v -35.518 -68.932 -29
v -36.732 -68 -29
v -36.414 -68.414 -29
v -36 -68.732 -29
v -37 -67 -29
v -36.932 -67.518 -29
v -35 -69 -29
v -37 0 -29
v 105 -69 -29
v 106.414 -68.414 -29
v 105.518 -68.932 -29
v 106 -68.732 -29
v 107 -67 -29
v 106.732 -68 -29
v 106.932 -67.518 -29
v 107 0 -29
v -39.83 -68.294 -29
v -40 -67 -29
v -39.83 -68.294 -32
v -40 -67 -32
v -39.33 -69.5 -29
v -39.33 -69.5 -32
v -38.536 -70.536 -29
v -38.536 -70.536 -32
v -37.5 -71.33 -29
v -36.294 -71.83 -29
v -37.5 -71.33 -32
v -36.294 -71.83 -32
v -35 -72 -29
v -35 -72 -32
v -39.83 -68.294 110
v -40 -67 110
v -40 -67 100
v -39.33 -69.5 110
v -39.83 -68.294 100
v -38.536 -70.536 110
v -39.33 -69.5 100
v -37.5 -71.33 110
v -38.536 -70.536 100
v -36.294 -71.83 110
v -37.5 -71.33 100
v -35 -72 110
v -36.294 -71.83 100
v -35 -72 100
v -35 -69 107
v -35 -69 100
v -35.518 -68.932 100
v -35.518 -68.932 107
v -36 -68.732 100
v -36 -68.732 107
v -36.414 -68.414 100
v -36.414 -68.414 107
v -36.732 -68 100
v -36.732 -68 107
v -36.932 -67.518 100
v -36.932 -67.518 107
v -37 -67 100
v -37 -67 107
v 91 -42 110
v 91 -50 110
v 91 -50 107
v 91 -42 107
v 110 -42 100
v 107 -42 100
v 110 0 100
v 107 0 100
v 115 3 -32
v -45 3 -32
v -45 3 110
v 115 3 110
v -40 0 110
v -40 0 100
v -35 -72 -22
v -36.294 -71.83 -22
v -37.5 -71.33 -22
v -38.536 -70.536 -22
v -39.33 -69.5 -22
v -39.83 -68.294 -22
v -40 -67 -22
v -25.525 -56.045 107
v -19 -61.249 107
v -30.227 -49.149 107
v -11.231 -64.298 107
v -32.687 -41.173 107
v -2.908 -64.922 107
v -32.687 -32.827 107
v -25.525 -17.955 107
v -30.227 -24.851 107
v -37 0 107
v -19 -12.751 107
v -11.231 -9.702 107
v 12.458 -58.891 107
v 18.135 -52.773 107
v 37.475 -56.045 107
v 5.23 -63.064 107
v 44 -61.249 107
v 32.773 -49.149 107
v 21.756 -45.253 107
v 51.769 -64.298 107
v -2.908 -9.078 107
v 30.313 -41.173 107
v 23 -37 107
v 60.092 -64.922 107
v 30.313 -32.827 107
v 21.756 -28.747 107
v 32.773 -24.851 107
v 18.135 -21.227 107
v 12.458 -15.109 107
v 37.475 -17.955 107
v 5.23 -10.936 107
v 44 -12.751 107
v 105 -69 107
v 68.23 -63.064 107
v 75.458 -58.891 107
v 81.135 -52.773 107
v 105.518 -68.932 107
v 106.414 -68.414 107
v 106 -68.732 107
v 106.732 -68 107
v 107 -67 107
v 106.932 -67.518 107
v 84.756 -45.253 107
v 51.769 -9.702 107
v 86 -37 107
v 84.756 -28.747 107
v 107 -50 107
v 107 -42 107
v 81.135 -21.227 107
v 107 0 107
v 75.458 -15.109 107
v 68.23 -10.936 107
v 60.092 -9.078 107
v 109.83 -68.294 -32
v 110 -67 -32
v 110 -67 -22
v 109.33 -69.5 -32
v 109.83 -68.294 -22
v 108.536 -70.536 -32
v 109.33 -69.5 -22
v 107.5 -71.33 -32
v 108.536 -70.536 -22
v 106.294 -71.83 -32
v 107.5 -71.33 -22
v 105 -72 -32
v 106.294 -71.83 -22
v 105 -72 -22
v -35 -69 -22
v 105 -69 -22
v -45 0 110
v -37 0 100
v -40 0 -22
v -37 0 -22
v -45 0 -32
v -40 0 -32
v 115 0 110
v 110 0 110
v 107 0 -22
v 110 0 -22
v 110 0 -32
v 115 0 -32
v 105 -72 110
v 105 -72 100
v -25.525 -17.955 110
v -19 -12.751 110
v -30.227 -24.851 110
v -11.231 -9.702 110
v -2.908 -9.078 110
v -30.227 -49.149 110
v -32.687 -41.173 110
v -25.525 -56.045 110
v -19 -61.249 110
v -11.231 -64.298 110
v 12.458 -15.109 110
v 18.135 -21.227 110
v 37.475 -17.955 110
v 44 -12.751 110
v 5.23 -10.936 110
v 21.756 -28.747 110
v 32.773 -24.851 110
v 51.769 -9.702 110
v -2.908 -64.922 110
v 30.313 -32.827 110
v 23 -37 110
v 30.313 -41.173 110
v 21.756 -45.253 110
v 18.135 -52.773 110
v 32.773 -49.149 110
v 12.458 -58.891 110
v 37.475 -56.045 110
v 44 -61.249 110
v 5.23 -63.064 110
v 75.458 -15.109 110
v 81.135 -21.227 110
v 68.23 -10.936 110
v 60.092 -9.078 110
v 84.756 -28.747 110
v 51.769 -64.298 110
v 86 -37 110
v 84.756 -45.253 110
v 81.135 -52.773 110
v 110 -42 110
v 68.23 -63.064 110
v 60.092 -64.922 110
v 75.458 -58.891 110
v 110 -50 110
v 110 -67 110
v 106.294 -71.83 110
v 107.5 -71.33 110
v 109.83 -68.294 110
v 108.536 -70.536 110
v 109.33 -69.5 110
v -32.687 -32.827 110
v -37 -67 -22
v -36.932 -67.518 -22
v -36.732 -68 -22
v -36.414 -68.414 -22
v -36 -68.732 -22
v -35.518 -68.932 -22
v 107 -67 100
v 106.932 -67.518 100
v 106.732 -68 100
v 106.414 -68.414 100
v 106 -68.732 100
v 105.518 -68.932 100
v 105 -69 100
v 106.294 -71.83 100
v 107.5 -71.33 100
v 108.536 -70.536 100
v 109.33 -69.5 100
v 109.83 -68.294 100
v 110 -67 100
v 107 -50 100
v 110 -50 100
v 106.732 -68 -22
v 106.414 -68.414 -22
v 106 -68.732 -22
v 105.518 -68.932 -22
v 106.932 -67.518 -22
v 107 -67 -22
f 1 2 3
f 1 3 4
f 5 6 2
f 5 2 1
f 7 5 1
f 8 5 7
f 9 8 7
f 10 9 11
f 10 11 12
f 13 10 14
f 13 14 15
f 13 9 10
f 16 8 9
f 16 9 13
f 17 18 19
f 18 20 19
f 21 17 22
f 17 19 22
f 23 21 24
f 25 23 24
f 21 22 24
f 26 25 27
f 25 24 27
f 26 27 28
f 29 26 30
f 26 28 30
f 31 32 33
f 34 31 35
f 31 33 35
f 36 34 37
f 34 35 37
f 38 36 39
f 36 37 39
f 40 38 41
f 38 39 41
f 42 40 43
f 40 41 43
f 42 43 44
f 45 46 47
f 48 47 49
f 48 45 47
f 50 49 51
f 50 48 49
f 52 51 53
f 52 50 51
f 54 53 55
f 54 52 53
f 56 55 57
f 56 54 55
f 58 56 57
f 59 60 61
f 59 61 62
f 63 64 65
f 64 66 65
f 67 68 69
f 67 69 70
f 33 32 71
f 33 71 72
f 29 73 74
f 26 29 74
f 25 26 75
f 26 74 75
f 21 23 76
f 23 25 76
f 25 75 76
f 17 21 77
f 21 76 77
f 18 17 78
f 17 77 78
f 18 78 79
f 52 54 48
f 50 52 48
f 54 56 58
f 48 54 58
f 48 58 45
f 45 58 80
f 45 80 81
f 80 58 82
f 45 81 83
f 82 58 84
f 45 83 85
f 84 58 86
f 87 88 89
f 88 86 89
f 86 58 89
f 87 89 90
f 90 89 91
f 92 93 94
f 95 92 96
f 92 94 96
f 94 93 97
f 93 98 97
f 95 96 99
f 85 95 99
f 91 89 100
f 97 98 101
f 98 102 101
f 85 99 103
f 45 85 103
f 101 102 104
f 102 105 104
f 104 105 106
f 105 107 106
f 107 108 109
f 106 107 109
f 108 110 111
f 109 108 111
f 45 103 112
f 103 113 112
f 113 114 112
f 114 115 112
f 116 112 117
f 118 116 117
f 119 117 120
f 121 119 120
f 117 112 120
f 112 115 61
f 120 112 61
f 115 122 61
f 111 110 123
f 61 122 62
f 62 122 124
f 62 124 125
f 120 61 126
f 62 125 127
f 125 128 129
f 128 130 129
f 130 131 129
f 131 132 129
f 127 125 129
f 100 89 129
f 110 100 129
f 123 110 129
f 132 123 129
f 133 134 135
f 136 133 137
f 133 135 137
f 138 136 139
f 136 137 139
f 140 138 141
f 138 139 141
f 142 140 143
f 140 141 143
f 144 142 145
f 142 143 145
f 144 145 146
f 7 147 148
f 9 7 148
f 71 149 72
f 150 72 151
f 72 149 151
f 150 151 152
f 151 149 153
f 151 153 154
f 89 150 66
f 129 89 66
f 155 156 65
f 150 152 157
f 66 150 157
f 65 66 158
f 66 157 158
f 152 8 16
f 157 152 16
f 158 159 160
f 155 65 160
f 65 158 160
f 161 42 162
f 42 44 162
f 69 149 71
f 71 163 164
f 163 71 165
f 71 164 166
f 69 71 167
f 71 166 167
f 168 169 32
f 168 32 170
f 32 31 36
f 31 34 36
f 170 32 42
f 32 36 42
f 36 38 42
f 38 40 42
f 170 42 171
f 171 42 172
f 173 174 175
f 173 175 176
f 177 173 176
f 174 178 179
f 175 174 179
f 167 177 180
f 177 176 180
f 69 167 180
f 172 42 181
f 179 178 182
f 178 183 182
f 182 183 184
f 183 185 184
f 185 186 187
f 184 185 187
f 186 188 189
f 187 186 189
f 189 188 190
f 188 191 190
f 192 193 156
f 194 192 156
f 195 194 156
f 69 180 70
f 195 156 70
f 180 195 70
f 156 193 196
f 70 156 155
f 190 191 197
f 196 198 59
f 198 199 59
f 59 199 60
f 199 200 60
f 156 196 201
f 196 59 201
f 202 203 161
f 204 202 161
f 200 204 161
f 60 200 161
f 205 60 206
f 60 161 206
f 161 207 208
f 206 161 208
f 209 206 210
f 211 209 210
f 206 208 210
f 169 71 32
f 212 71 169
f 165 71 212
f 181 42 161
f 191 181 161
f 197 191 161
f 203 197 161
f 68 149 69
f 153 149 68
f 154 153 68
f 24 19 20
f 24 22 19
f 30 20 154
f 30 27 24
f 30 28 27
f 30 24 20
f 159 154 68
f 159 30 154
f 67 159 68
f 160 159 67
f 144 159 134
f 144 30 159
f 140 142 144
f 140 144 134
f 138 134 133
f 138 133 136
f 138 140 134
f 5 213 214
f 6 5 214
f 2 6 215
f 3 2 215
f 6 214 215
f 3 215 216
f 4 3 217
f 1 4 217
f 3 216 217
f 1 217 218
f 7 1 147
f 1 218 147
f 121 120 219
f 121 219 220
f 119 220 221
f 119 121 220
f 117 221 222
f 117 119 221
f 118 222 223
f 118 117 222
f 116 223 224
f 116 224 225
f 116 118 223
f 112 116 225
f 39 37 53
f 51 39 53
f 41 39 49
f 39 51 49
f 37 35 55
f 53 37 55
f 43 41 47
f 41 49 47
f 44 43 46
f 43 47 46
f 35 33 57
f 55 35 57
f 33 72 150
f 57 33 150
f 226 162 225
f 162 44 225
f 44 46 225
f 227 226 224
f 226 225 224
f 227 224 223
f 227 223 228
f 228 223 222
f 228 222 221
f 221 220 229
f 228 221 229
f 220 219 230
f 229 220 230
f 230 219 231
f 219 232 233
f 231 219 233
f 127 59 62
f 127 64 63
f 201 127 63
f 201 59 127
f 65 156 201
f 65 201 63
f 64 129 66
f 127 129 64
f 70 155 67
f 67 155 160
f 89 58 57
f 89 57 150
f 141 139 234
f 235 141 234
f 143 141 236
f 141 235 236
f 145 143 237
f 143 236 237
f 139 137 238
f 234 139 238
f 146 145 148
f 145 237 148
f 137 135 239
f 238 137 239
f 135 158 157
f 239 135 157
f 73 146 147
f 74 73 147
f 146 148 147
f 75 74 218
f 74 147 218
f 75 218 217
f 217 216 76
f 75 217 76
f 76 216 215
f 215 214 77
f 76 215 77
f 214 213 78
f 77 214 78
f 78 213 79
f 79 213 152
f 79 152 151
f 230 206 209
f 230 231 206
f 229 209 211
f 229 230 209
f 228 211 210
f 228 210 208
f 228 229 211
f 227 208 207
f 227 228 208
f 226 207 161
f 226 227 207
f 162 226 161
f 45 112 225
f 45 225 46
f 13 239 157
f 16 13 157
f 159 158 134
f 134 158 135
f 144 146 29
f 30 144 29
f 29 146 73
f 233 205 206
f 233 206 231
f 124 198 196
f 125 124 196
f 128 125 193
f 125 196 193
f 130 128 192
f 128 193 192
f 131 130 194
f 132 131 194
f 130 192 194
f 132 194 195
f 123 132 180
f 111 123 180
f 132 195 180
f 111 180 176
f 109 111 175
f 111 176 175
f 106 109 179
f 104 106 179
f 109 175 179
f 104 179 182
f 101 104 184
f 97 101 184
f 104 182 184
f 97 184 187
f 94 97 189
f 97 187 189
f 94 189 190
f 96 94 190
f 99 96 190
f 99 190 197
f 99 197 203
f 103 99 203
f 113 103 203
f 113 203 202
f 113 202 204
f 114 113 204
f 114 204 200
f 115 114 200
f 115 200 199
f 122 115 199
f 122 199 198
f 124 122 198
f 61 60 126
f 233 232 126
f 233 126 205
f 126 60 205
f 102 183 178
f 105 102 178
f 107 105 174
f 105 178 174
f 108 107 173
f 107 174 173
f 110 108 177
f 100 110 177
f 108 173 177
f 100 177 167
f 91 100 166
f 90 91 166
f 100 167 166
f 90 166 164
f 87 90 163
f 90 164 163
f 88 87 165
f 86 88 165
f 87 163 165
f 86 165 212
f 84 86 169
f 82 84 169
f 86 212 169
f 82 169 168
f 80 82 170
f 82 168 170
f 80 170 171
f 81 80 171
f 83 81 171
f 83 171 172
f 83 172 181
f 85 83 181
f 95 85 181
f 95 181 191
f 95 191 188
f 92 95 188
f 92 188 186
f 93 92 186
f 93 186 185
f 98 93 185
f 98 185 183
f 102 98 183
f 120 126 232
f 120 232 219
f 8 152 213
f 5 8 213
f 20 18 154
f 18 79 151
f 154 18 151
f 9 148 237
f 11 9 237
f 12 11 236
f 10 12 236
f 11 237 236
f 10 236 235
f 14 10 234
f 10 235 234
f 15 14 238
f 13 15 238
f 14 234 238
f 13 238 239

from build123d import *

# Parameters (mm, degrees)
SKETCH1_W                        = 160
SKETCH1_H                        = 142
ROOF_DEPTH                       = 3
SKETCH2_W                        = 150
SKETCH2_H                        = 3
FRONT_AND_REAR_WALLS_DEPTH       = 72
FILLET1_R                        = 5
FRONT_COVER_REINFORCEMENT_DEPTH  = 10
REAR_START                       = -10
REAR_COVER_REINFORCEMENT_DEPTH   = 10
SKETCH5_W                        = 19
SKETCH5_H                        = 8
DISPLAY_CABLE_PASSTHRU_CUT_DEPTH = 10
SKETCH6_R                        = 28
FAN_CUTOUTS_DEPTH                = 10


with BuildPart() as part:
    # Sketch1 → ROOF (new body)
    with BuildSketch(Plane(origin=(0, 0, 0), x_dir=(1, 0, 0), z_dir=(0, 1, 0))):
        with Locations((35, -39)):
            Rectangle(SKETCH1_W, SKETCH1_H)
    extrude(amount=ROOF_DEPTH)

    # Sketch2 → FRONT AND REAR WALLS (add)
    with BuildSketch(Plane(origin=(0, 0, 0), x_dir=(1, 0, 0), z_dir=(0, 1, 0))):
        with Locations((35, 30.5)):
            Rectangle(SKETCH2_W, SKETCH2_H)
        with Locations((35, -108.5)):
            Rectangle(SKETCH2_W, SKETCH2_H)
    extrude(amount=-FRONT_AND_REAR_WALLS_DEPTH)

    # Fillet1
    fillet1_edges = [part.edges().sort_by_distance(p)[0] for p in [
        (-40, -72, -30.5),
        (110, -72, -30.5),
        (-40, -72, 108.5),
        (110, -72, 108.5),
    ]]
    fillet(fillet1_edges, radius=FILLET1_R)

    # Sketch3 → FRONT COVER REINFORCEMENT (add)
    with BuildSketch(Plane.XY.offset(110)):
        with BuildLine():
            Line((110, -67), (110, 0))
            Line((110, 0), (107, 0))
            Line((107, 0), (107, -67))
            ThreePointArc((107, -67), (106.414213562, -68.414213562), (105, -69))
            Line((105, -69), (-35, -69))
            ThreePointArc((-35, -69), (-36.414213562, -68.414213562), (-37, -67))
            Line((-37, -67), (-37, 0))
            Line((-37, 0), (-40, 0))
            Line((-40, 0), (-40, -67))
            ThreePointArc((-40, -67), (-38.535533906, -70.535533906), (-35, -72))
            Line((-35, -72), (105, -72))
            ThreePointArc((105, -72), (108.535533906, -70.535533906), (110, -67))
        make_face()
    extrude(amount=-FRONT_COVER_REINFORCEMENT_DEPTH)

    # Sketch4 → REAR COVER REINFORCEMENT (add)
    with BuildSketch(Plane(origin=(0, 0, -32), x_dir=(-1, 0, 0), z_dir=(0, 0, -1)).offset(REAR_START)):
        with BuildLine():
            Line((-110, 0), (-110, -67))
            ThreePointArc((-110, -67), (-108.535533906, -70.535533906), (-105, -72))
            Line((-105, -72), (35, -72))
            ThreePointArc((35, -72), (38.535533906, -70.535533906), (40, -67))
            Line((40, -67), (40, 0))
            Line((40, 0), (37, 0))
            Line((37, 0), (37, -67))
            ThreePointArc((37, -67), (36.414213562, -68.414213562), (35, -69))
            Line((35, -69), (-105, -69))
            ThreePointArc((-105, -69), (-106.414213562, -68.414213562), (-107, -67))
            Line((-107, -67), (-107, 0))
            Line((-107, 0), (-110, 0))
        make_face()
    extrude(amount=REAR_COVER_REINFORCEMENT_DEPTH)

    # Sketch5 → DISPLAY CABLE PASSTHRU CUT (cut)
    with BuildSketch(Plane.XY.offset(110)):
        with Locations((100.5, -46)):
            Rectangle(SKETCH5_W, SKETCH5_H)
    extrude(amount=-DISPLAY_CABLE_PASSTHRU_CUT_DEPTH, mode=Mode.SUBTRACT)

    # Sketch6 → FAN CUTOUTS (cut)
    with BuildSketch(Plane.XY.offset(110)):
        with Locations((-5, -37)):
            Circle(SKETCH6_R)
        with Locations((58, -37)):
            Circle(SKETCH6_R)
    extrude(amount=-FAN_CUTOUTS_DEPTH, mode=Mode.SUBTRACT)


solid = part.part
